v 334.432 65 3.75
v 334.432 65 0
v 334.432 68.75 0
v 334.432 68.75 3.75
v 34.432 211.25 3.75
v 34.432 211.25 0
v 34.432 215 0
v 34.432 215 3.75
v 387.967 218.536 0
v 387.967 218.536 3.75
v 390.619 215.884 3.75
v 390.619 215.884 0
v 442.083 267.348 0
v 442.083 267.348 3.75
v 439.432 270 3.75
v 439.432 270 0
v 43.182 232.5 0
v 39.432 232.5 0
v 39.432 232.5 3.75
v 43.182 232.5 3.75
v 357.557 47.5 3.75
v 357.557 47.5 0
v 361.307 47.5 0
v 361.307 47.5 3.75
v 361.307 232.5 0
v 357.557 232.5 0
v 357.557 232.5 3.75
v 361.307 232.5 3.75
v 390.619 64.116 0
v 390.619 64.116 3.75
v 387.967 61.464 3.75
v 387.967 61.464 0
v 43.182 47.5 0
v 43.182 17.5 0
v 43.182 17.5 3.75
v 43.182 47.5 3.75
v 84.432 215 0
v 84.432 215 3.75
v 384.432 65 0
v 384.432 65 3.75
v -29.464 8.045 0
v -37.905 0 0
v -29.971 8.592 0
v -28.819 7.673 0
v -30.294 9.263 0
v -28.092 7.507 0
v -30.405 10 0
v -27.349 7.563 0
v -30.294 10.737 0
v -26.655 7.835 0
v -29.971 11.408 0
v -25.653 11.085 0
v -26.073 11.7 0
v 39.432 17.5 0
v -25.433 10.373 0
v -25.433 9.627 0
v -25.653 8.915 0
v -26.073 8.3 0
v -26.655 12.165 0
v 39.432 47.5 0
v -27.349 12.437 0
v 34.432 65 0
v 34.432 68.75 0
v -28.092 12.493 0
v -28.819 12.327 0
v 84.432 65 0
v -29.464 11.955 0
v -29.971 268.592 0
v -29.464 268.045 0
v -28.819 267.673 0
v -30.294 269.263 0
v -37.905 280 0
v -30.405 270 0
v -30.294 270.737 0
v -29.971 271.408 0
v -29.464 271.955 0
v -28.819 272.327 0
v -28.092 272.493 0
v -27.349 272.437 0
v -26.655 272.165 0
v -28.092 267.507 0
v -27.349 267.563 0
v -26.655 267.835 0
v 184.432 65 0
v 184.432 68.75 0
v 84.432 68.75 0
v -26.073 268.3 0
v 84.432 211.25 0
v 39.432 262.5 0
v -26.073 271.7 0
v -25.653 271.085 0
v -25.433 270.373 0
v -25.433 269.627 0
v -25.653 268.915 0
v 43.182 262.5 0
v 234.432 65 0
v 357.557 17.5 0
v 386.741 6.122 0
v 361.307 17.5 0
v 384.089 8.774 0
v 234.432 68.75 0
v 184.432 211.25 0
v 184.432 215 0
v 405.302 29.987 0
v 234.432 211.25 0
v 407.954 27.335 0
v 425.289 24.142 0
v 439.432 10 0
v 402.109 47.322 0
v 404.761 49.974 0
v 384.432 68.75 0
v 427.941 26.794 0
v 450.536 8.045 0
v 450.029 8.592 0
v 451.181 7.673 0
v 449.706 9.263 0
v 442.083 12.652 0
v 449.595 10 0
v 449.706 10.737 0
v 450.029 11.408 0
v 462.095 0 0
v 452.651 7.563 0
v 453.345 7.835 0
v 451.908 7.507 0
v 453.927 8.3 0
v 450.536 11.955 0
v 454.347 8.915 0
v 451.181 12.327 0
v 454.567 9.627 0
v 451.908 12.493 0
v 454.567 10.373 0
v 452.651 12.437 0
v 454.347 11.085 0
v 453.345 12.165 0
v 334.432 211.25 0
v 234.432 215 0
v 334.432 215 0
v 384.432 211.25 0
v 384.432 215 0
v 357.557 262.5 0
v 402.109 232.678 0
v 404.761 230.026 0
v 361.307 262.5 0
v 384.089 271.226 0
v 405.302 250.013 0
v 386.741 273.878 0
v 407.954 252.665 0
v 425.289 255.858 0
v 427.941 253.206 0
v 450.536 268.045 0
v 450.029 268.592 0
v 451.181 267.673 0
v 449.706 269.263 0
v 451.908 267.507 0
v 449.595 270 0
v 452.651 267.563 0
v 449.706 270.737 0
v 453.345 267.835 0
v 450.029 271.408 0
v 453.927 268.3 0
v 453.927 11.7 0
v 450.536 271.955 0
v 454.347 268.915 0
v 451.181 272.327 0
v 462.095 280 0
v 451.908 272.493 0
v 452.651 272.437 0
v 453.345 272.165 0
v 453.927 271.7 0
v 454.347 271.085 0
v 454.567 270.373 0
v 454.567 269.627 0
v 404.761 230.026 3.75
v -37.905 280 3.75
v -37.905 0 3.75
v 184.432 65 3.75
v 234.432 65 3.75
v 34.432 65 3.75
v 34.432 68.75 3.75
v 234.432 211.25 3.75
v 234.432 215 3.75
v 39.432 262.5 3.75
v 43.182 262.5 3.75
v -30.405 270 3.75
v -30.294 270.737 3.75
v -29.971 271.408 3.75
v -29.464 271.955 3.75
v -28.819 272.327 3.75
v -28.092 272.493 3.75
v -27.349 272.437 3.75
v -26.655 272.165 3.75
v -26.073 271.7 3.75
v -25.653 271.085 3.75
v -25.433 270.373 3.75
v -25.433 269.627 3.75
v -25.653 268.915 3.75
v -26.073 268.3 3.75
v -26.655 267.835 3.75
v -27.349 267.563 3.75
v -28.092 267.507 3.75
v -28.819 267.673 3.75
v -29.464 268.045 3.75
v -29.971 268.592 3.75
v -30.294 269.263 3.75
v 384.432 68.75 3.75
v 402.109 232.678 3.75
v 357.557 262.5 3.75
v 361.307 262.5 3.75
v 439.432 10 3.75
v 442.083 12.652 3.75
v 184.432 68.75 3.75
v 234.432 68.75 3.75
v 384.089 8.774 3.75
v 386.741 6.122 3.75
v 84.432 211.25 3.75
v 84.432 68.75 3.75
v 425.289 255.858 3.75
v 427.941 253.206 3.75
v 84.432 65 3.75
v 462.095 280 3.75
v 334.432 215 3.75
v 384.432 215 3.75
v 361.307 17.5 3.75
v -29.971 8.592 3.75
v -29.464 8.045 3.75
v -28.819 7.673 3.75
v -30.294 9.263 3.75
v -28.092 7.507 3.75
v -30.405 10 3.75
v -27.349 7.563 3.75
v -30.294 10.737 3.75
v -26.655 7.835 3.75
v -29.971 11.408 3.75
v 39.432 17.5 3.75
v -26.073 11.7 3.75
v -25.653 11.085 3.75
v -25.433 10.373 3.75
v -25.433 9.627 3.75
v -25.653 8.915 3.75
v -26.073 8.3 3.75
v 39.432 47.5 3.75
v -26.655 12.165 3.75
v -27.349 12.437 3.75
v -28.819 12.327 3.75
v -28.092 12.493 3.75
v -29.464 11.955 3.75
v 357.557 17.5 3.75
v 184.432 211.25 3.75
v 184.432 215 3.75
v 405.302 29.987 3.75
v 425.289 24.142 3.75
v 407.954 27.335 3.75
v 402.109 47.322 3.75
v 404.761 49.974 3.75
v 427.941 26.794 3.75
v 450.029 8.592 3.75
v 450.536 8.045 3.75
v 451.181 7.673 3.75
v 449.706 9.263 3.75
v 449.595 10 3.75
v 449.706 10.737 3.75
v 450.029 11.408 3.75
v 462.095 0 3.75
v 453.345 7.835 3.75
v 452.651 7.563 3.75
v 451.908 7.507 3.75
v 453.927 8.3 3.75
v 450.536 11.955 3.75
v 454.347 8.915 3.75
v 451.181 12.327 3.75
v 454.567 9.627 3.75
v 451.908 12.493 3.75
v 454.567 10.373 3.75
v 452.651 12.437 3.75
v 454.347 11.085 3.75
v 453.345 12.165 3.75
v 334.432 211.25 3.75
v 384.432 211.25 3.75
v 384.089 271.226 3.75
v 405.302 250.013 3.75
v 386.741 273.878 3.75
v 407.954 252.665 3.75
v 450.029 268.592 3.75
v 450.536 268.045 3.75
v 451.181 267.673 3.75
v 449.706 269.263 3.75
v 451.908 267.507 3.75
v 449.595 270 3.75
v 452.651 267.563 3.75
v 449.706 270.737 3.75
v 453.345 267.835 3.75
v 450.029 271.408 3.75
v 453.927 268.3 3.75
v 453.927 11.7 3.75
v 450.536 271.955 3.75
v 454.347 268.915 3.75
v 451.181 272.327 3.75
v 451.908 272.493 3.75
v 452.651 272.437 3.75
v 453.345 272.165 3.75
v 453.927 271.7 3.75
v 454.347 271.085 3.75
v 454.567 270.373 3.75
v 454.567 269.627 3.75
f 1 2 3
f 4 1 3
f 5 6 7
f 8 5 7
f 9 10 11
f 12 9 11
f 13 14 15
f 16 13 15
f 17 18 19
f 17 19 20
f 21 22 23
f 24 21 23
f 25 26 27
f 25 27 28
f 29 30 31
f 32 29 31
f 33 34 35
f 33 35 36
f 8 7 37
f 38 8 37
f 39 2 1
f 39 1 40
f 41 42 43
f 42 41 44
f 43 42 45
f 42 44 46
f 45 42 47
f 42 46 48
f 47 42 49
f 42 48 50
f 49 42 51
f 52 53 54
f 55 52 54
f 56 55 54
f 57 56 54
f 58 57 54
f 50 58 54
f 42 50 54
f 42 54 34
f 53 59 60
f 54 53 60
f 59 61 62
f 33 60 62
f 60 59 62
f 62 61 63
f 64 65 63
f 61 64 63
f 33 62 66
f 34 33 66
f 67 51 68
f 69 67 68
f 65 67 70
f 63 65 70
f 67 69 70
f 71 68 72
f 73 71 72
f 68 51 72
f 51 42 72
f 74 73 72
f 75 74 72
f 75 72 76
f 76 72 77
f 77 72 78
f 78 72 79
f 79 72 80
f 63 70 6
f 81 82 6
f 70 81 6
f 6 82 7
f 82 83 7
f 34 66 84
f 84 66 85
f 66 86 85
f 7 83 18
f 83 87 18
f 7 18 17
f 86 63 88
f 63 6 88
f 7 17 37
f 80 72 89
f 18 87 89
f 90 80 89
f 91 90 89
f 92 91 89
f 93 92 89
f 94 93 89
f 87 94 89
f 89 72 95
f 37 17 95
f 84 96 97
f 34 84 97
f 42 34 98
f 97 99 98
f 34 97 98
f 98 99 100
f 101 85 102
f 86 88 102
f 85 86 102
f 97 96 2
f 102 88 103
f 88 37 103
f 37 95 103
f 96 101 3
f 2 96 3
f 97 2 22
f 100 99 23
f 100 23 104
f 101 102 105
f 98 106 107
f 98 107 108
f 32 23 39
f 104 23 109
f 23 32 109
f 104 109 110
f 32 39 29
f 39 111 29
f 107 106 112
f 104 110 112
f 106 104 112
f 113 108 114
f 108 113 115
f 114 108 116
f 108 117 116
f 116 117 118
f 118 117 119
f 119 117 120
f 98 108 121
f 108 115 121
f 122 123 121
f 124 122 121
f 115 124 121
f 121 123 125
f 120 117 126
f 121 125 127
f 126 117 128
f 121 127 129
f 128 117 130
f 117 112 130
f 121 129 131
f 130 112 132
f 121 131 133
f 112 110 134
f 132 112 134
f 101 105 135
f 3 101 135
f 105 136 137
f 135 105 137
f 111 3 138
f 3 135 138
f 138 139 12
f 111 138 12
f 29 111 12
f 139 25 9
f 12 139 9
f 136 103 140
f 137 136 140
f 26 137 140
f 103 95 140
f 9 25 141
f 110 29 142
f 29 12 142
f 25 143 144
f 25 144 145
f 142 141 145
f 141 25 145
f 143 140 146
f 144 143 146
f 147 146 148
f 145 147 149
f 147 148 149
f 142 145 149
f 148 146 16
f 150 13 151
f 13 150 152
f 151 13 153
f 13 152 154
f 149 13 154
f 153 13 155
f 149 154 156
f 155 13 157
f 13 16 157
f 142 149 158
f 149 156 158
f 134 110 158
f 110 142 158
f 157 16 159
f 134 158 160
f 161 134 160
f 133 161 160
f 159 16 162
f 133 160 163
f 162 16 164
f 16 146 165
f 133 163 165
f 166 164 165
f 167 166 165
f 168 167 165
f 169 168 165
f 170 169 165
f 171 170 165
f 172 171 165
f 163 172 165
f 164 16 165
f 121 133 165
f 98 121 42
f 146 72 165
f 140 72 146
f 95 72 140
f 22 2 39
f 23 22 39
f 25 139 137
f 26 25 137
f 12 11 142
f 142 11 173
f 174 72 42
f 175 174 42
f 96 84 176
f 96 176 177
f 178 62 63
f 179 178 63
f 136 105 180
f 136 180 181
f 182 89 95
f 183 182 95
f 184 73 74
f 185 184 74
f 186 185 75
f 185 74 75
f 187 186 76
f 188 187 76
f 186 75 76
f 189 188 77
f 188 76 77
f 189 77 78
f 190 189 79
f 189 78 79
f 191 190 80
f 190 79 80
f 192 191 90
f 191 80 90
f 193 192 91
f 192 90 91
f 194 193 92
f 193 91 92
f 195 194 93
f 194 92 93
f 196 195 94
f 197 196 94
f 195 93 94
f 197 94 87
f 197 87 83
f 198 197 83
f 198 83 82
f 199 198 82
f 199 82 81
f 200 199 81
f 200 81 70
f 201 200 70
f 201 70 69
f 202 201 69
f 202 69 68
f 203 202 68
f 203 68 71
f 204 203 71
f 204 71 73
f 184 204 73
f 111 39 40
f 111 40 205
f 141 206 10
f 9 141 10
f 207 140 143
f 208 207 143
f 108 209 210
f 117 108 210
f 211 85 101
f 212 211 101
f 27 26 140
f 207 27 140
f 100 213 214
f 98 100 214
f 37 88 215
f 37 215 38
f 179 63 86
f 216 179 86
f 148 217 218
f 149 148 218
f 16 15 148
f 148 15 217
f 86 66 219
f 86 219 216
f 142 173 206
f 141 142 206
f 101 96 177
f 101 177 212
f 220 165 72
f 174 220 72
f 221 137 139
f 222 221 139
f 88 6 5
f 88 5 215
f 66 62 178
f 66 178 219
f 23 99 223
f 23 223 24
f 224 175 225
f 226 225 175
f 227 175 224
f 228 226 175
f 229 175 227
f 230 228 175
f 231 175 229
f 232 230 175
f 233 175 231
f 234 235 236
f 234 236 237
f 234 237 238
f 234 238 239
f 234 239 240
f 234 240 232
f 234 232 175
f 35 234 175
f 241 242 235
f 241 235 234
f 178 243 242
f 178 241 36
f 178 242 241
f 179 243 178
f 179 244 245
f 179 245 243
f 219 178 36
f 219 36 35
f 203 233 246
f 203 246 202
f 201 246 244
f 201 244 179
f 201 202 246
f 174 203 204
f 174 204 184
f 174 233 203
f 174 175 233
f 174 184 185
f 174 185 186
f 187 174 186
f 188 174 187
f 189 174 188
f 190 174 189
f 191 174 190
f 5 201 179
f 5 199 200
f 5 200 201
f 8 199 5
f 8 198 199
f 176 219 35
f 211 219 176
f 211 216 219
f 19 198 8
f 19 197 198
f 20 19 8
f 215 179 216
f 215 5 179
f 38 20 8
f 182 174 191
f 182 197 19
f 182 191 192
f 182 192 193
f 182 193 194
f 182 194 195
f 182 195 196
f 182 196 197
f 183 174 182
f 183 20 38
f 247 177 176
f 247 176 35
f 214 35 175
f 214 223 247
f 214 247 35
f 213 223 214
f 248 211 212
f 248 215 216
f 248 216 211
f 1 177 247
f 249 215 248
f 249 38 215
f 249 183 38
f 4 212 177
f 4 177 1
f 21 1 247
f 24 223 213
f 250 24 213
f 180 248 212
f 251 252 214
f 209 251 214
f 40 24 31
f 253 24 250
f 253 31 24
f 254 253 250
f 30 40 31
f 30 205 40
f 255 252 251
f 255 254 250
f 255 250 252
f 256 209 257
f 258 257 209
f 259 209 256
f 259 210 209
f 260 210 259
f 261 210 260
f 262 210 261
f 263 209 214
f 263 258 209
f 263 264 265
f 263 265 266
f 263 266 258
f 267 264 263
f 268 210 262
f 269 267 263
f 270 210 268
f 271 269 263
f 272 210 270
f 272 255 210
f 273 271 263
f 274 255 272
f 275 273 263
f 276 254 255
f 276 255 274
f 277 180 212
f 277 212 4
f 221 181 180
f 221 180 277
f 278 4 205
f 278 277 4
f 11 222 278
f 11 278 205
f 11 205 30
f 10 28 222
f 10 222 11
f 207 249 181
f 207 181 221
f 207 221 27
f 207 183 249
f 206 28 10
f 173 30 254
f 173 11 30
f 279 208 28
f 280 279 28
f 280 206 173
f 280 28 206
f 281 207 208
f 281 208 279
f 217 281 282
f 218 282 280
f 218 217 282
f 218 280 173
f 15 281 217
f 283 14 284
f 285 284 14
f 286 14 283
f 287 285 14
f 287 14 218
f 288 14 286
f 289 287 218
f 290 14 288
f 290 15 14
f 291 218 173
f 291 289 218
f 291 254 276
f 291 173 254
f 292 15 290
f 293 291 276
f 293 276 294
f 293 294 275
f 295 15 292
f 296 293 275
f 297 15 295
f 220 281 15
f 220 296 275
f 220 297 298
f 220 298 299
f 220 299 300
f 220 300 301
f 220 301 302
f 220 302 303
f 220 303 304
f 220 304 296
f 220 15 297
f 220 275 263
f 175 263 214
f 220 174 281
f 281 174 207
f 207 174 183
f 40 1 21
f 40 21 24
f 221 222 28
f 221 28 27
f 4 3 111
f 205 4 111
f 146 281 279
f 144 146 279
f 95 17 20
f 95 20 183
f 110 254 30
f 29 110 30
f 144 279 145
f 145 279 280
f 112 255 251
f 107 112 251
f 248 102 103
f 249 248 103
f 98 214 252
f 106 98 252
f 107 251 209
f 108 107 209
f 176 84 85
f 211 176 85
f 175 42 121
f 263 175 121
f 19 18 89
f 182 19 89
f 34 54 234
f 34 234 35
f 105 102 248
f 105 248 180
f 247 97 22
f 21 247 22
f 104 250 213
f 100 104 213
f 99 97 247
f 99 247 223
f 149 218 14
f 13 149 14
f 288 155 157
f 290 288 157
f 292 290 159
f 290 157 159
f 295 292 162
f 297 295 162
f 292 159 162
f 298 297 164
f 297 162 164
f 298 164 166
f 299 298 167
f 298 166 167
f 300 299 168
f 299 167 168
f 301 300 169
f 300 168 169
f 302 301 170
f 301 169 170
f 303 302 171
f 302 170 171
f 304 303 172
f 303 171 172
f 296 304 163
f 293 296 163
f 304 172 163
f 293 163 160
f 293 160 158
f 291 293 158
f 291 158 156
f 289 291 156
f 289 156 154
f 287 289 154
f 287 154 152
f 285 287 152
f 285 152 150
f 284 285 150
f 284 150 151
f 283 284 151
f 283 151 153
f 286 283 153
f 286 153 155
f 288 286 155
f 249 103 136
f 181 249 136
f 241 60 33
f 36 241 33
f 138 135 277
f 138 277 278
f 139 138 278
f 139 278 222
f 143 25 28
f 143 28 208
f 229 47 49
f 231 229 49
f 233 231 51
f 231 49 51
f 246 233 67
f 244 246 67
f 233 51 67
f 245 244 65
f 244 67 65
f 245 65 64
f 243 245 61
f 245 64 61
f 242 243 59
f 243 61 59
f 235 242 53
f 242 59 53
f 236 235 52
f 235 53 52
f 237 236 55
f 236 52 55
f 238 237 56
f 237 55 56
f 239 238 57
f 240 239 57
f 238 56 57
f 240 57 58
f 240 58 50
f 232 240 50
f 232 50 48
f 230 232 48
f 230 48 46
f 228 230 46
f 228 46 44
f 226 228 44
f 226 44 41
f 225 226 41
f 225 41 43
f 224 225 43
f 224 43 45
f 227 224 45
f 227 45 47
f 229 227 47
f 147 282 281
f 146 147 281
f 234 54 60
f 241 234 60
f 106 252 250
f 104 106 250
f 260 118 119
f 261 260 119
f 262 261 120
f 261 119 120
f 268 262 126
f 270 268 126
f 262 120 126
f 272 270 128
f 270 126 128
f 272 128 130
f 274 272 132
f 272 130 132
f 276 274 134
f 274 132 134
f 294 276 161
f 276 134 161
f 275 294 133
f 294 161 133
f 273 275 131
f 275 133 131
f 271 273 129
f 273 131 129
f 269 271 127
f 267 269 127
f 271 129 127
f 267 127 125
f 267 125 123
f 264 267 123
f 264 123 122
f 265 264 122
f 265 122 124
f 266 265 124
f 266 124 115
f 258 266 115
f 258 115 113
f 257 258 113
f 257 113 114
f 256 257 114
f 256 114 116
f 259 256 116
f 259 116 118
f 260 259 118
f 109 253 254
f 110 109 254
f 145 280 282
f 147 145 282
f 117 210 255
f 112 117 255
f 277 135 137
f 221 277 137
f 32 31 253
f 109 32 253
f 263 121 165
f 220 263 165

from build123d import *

# Parameters (mm, degrees)
F0_W     = 3.75
F0_H     = 30
F0_W_2   = 50
F0_H_2   = 3.75
F1_DEPTH = 3.75
F3_D     = 5
F5_DEPTH = 3.75


# Not quite as in the source:
# - a feature names something its author has since deleted; it is built from what else it names


with BuildPart() as f1:
    # F0 (on Top) → F1 (new body)
    with BuildSketch(Plane.XY):
        Polygon((-37.9051826894, 0), (12.0948173106, 0), (462.0948173106, 0), (462.0948173106, 280), (62.0948173106, 280), (-37.9051826894, 280), align=None)
        with Locations((41.3065613726, 32.5)):
            Rectangle(F0_W, F0_H, mode=Mode.SUBTRACT)
        with Locations((59.4315613726, 66.875)):
            Rectangle(F0_W_2, F0_H_2, mode=Mode.SUBTRACT)
        with Locations((209.4315613726, 66.875)):
            Rectangle(F0_W_2, F0_H_2, mode=Mode.SUBTRACT)
        with Locations((359.4315613726, 32.5)):
            Rectangle(F0_W, F0_H, mode=Mode.SUBTRACT)
        with Locations((359.4315613726, 66.875)):
            Rectangle(F0_W_2, F0_H_2, mode=Mode.SUBTRACT)
        with Locations((59.4315613726, 213.125)):
            Rectangle(F0_W_2, F0_H_2, mode=Mode.SUBTRACT)
        with Locations((41.3065613726, 247.5)):
            Rectangle(F0_W, F0_H, mode=Mode.SUBTRACT)
        with Locations((209.4315613726, 213.125)):
            Rectangle(F0_W_2, F0_H_2, mode=Mode.SUBTRACT)
        with Locations((359.4315613726, 213.125)):
            Rectangle(F0_W_2, F0_H_2, mode=Mode.SUBTRACT)
        with Locations((359.4315613726, 247.5)):
            Rectangle(F0_W, F0_H, mode=Mode.SUBTRACT)
    extrude(amount=F1_DEPTH)

    # F3 (through all)
    with Locations(Plane.XY.offset(3.75)):
        with Locations((-27.9051826894, 10), (-27.9051826894, 270), (452.0948173106, 10), (452.0948173106, 270)):
            Hole(F3_D / 2)

    # F4 (on face) → F5 (cut)
    with BuildSketch(Plane.XY.offset(3.75)):
        Polygon((442.083211802, 267.3483495706), (439.4315613726, 270), (425.2894257488, 255.8578643763), (427.9410761783, 253.2062139468), align=None)
        Polygon((402.1092280247, 232.6776666521), (387.9670924009, 218.5355310284), (390.6187428304, 215.8838805989), (404.7608784541, 230.0260162227), align=None)
        Polygon((386.740880854, 273.8778619764), (384.0892304246, 271.2262115469), (405.3024338602, 250.0130081113), (407.9540842896, 252.6646585408), align=None)
        Polygon((387.9670924009, 61.4644689716), (402.1092280247, 47.3223333479), (404.7608784541, 49.9739837773), (390.6187428304, 64.1161194011), align=None)
        Polygon((405.3024338602, 29.9869918887), (384.0892304246, 8.7737884531), (386.740880854, 6.1221380236), (407.9540842896, 27.3353414592), align=None)
        Polygon((427.9410761783, 26.7937860532), (425.2894257488, 24.1421356237), (439.4315613726, 10), (442.083211802, 12.6516504294), align=None)
    extrude(amount=-F5_DEPTH, mode=Mode.SUBTRACT)


solid = f1.part
